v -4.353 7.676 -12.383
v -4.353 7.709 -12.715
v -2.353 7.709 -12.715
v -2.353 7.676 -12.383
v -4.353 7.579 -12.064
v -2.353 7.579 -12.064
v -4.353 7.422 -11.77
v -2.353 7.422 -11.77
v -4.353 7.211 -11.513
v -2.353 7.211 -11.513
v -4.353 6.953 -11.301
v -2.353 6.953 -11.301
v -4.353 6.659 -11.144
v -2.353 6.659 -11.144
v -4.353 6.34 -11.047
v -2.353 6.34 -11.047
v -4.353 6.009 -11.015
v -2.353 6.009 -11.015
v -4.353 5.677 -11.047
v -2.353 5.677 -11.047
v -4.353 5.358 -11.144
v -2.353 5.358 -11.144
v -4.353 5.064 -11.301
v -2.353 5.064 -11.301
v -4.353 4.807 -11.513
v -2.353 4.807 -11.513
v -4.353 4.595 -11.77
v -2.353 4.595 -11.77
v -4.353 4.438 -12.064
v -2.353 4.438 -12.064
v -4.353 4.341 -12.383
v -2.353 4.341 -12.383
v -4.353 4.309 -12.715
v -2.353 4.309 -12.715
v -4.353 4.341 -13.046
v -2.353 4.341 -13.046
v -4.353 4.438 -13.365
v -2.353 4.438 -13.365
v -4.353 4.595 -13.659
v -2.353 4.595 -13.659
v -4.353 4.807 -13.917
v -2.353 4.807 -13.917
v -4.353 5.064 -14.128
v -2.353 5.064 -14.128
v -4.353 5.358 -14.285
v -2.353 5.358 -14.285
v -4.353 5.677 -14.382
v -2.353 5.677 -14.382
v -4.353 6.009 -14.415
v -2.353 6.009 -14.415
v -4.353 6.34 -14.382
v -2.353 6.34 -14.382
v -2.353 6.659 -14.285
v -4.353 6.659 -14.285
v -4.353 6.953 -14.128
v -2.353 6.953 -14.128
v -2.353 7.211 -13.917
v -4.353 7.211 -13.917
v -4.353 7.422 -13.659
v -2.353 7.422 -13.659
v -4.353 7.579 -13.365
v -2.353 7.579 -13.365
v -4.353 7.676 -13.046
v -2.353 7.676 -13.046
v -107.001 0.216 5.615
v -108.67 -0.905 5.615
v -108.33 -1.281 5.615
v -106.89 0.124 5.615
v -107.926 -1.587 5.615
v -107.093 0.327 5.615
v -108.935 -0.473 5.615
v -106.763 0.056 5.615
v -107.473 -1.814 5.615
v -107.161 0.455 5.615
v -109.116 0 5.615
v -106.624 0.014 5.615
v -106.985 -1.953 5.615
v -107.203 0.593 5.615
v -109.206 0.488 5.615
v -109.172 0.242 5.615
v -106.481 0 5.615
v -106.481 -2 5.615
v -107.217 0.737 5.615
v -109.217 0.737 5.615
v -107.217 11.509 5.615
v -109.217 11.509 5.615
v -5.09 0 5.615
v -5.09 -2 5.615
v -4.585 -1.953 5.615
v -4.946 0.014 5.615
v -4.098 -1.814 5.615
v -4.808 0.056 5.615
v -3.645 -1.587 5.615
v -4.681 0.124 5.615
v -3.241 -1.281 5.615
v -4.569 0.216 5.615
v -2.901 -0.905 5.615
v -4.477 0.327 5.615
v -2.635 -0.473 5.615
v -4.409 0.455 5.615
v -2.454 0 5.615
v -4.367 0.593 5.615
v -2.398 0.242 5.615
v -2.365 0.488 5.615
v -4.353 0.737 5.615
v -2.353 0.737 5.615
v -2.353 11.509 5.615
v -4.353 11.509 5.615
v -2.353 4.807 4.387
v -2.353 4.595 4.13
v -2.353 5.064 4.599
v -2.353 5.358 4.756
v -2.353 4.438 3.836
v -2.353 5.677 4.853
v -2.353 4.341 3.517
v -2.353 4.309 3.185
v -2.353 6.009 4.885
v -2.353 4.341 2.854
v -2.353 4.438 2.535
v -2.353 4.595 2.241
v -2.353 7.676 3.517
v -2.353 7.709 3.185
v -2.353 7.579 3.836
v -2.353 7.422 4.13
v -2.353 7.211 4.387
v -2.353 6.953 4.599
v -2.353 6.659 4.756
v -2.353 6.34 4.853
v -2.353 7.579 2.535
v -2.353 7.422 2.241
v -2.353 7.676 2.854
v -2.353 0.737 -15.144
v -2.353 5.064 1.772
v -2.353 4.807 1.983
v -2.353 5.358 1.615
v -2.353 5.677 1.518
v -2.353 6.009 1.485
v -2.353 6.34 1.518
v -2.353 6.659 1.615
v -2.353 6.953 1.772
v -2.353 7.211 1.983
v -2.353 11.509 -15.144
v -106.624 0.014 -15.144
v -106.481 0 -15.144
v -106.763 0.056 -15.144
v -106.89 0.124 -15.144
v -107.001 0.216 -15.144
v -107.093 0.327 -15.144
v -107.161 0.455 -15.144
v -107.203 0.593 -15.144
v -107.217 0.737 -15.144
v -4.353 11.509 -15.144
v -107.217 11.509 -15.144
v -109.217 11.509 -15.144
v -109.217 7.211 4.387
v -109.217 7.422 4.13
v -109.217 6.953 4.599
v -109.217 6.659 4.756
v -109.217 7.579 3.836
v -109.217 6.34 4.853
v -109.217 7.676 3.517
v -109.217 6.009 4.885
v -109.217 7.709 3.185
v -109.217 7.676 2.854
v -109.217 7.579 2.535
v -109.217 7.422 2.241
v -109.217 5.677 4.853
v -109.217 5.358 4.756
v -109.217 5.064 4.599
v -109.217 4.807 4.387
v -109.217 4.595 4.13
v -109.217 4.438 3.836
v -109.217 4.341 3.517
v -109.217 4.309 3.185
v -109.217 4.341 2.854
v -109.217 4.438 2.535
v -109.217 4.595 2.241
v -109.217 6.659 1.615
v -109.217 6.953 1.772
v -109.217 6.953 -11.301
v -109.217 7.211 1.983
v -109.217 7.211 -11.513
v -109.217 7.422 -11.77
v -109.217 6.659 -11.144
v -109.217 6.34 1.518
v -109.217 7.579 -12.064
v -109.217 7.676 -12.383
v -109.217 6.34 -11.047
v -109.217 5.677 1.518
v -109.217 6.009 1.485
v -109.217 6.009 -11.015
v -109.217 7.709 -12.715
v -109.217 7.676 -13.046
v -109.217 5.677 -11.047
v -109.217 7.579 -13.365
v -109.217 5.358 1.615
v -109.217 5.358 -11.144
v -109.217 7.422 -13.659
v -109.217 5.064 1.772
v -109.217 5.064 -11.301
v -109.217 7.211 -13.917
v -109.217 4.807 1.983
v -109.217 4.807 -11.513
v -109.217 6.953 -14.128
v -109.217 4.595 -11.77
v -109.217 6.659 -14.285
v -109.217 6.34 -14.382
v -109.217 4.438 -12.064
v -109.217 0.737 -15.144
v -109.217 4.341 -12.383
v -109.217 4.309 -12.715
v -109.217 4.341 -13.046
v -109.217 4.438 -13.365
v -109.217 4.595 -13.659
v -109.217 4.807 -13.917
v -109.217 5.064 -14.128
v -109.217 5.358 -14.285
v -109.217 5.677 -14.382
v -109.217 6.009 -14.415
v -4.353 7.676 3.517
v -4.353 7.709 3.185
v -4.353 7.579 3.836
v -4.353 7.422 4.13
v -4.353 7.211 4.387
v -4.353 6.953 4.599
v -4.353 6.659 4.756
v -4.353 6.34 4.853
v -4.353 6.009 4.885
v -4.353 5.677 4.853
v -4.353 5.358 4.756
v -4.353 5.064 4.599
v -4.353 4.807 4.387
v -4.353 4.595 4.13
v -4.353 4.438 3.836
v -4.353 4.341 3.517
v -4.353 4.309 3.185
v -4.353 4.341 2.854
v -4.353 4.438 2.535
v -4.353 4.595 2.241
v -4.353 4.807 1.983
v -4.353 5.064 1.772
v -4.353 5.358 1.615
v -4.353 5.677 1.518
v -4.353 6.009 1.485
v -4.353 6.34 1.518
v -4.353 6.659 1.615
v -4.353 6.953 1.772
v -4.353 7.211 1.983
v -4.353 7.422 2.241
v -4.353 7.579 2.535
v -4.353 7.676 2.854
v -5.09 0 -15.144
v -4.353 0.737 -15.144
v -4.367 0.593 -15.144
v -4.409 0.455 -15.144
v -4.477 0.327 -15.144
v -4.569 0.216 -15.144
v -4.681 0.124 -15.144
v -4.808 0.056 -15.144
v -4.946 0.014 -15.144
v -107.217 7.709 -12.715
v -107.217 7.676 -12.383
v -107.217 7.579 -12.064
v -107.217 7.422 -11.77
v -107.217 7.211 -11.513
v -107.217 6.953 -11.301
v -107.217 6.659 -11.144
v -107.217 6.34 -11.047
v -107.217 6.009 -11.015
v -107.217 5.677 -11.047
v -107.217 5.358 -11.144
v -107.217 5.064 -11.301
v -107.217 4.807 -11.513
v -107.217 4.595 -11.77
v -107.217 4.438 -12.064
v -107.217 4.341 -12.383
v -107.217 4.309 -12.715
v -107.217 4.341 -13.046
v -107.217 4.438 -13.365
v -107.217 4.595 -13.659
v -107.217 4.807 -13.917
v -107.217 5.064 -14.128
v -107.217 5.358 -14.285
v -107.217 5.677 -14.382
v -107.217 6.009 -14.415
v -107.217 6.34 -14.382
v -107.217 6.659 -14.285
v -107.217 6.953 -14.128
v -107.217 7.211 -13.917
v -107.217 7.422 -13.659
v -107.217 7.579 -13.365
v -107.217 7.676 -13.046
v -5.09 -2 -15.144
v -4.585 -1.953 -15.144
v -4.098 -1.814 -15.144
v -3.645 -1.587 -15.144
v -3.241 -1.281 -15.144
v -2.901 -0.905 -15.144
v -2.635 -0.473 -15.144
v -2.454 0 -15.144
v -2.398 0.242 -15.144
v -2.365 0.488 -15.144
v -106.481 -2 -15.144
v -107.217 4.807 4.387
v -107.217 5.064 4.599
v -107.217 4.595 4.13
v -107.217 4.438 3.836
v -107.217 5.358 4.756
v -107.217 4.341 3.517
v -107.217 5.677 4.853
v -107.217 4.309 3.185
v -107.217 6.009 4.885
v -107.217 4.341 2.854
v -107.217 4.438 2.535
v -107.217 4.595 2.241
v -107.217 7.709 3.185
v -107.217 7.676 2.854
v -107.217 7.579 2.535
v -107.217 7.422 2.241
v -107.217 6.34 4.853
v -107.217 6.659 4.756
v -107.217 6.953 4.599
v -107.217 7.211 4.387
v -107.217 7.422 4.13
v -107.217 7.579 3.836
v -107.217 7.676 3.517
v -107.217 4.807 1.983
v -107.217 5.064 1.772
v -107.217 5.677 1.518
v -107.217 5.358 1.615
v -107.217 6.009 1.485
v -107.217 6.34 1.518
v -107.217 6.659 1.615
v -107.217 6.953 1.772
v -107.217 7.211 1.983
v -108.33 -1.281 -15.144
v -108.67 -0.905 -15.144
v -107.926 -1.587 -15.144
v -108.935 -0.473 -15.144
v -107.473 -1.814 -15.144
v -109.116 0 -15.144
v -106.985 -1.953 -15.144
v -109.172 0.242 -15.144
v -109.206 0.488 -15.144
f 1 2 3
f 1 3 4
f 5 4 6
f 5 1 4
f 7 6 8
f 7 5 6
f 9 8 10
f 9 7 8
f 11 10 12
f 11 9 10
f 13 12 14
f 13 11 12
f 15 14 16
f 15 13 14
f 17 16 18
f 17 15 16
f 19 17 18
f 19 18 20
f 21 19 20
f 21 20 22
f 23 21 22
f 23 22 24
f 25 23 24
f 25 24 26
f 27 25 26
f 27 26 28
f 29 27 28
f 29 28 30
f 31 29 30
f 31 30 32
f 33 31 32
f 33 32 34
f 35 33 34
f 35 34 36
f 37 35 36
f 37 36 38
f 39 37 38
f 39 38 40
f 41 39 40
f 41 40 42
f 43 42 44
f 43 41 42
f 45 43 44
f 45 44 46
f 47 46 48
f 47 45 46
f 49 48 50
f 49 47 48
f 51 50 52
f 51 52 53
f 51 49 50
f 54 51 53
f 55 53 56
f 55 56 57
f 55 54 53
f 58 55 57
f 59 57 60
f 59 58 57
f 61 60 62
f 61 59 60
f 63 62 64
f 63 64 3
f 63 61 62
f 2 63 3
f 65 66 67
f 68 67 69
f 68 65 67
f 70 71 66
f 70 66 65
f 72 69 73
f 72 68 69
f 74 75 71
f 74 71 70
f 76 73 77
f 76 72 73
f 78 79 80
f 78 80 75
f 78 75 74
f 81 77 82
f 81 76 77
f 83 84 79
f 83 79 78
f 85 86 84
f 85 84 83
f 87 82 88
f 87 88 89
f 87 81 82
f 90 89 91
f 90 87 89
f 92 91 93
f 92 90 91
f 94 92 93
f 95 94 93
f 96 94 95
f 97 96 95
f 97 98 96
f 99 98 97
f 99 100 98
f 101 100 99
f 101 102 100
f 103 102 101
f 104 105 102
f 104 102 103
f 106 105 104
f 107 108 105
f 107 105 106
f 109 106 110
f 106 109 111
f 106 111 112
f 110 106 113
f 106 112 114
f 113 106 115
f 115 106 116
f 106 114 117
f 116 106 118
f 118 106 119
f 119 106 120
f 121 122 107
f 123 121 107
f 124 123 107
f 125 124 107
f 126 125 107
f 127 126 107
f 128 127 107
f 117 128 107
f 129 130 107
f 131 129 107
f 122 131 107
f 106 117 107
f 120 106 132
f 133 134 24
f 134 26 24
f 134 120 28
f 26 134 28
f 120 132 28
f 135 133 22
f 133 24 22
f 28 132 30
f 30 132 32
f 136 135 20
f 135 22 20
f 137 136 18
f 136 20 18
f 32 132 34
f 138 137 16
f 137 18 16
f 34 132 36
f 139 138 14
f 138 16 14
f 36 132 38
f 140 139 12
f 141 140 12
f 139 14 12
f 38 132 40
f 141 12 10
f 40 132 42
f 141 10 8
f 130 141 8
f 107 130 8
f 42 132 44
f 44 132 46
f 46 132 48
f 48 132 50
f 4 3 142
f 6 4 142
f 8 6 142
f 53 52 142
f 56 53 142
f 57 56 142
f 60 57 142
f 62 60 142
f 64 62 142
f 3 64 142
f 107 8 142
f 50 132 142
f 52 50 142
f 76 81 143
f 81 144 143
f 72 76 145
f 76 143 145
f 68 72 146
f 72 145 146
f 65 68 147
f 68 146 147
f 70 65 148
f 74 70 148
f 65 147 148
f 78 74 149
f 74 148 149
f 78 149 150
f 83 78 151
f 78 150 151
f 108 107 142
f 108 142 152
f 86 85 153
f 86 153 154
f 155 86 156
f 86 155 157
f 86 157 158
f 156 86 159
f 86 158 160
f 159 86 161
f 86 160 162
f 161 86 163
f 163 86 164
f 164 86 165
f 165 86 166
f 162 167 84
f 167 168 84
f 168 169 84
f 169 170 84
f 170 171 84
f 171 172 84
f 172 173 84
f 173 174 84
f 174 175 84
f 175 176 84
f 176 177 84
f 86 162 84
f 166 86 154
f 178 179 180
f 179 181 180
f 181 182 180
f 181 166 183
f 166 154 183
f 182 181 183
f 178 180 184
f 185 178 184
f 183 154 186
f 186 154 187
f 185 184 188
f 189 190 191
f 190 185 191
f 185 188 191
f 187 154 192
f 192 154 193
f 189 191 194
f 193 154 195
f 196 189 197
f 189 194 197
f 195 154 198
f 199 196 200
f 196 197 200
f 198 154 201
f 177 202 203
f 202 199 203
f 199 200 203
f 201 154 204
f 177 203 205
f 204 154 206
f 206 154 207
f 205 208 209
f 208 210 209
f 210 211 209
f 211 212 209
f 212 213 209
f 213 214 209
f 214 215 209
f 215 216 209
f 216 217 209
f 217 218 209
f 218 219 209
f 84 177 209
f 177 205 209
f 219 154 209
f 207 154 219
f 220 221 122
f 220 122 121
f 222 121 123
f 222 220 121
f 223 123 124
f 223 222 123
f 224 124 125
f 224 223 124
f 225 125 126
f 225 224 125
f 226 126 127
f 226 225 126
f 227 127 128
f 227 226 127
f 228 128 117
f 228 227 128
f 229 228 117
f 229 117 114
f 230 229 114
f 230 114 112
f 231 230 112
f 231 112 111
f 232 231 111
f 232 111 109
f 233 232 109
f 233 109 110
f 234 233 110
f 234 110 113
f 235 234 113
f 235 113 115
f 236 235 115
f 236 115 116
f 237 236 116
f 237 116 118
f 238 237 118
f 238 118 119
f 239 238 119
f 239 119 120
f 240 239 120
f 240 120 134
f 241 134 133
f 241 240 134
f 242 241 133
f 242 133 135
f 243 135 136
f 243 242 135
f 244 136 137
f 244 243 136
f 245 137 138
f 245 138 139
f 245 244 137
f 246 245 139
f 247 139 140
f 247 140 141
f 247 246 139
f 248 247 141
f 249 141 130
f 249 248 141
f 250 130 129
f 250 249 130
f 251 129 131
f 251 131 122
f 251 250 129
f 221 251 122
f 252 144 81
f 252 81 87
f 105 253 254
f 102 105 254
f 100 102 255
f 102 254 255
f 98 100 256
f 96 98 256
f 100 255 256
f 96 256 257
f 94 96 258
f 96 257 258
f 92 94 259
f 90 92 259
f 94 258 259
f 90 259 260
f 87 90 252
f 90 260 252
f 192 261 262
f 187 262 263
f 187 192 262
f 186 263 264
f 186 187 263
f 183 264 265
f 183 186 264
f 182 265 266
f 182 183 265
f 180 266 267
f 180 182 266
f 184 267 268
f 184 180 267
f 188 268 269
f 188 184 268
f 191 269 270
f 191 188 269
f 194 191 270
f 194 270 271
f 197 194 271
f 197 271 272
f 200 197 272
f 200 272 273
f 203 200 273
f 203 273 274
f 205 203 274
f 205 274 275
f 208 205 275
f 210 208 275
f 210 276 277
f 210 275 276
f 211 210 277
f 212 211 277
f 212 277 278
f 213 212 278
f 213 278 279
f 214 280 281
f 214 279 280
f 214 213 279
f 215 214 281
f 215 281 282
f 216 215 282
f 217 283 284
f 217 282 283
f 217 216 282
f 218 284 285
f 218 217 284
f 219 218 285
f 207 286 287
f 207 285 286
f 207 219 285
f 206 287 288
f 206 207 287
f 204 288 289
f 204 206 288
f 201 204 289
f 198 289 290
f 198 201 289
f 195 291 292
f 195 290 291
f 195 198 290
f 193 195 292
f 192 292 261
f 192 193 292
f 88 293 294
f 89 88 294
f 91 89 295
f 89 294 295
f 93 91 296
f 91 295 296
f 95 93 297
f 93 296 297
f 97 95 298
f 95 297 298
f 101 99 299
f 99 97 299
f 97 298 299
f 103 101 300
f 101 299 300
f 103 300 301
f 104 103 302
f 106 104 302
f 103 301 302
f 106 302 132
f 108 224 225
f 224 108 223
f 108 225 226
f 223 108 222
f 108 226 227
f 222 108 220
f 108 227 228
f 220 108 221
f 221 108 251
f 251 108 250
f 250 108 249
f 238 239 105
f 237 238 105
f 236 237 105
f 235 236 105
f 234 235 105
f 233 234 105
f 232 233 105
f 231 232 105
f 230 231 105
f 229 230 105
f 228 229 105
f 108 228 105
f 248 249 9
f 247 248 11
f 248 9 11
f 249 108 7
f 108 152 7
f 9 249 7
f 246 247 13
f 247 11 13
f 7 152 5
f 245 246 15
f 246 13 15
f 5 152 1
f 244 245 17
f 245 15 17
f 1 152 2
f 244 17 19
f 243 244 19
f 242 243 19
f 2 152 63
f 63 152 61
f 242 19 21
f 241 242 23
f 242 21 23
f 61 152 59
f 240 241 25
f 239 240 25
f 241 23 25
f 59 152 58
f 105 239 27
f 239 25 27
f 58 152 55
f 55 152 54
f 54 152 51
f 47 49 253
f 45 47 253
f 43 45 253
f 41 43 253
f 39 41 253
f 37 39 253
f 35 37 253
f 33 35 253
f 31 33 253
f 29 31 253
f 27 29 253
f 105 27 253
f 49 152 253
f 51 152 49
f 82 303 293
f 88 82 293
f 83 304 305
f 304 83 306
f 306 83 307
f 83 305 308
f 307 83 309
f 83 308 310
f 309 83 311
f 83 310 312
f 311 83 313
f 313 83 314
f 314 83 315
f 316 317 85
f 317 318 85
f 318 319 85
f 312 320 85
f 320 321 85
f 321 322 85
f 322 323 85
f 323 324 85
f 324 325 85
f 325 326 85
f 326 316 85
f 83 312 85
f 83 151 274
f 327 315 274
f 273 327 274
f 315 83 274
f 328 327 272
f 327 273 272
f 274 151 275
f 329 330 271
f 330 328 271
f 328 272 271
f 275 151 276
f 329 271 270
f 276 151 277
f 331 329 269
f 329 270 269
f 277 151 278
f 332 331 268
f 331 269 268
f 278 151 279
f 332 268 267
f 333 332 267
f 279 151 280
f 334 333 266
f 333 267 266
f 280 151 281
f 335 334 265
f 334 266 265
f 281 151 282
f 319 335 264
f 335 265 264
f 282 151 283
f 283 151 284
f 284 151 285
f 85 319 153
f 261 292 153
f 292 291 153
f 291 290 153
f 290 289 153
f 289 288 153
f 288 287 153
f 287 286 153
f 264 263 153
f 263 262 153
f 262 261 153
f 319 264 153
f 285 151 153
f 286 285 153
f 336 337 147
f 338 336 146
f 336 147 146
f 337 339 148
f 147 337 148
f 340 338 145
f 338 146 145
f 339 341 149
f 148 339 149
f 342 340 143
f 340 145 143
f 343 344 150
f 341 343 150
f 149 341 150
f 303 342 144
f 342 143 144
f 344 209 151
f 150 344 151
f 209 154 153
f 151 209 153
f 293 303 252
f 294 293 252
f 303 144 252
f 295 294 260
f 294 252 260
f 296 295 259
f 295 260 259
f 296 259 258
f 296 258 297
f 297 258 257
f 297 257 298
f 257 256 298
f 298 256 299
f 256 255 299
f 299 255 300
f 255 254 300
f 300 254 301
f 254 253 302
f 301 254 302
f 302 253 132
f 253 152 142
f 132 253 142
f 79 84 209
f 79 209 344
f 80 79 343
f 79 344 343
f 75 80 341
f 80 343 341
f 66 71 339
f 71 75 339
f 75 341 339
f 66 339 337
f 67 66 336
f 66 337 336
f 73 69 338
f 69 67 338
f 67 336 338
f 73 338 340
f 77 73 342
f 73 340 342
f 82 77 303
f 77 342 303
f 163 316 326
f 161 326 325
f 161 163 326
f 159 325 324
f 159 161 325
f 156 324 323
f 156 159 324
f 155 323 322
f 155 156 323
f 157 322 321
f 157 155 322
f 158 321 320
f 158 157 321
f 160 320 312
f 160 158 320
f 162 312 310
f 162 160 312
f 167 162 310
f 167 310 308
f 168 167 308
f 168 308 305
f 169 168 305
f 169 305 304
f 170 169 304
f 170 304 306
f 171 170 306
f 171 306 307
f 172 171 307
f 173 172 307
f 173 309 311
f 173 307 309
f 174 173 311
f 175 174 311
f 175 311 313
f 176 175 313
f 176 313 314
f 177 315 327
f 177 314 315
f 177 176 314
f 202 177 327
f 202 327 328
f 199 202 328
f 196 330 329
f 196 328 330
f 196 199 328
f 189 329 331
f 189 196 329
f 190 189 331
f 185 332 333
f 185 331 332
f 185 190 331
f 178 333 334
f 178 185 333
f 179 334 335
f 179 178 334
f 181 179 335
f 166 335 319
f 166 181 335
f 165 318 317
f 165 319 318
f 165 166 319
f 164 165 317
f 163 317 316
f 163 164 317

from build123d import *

# Parameters (mm, degrees)
SKETCH_2_W             = 128.39072245
SKETCH_2_H             = 20.758785388
SKETCH_2_R             = 1.7
SM_BASE_FLANGE_1_DEPTH = 2
OTHER_START            = -15.144216699
OTHER_1_DEPTH          = 20.758785388
OTHER_START_2          = -11.014823905
OTHER_1_2_DEPTH        = 12.4999998
OTHER_1_3_DEPTH        = 0.729392594
OTHER_START_3          = 4.885176095
OTHER_1_4_DEPTH        = 0.729392594
OTHER_START_4          = -14.414824105
OTHER_1_5_DEPTH        = 19.3000002
OTHER_START_5          = -109.217240912
OTHER_1_6_OUTLINE_R    = 1.7
OTHER_1_6_DEPTH        = 106.86392245


with BuildPart() as part:
    # 基体-法兰1: sheet metal written as solids
    # Sketch 2 → 基体-法兰1 (new body)
    with BuildSketch(Plane(origin=(0, 0, 0), x_dir=(1, 0, 0), z_dir=(0, 1, 0))):
        with Locations((-55.785279687, 4.764824005)):
            Rectangle(SKETCH_2_W, SKETCH_2_H)
        with Locations(Location((2.910081538, 12.714824005, 0), (0, 0, 270))):
            Circle(SKETCH_2_R, mode=Mode.SUBTRACT)
        with Locations(Location((2.910081538, -3.185175995, 0), (0, 0, 270))):
            Circle(SKETCH_2_R, mode=Mode.SUBTRACT)
        with Locations(Location((-114.480640912, -3.185175995, 0), (0, 0, 90))):
            Circle(SKETCH_2_R, mode=Mode.SUBTRACT)
        with Locations(Location((-114.480640912, 12.714824005, 0), (0, 0, 90))):
            Circle(SKETCH_2_R, mode=Mode.SUBTRACT)
    extrude(amount=-SM_BASE_FLANGE_1_DEPTH)

    # Other 1: read off the stored shape, not the designer's step
    # Other 1 outline → Other 1 (cut)
    with BuildSketch(Plane.XY.offset(OTHER_START)):
        with BuildLine():
            Line((-119.980640912, -2), (-106.480640912, -2))
            ThreePointArc((-106.480640912, -2), (-108.134908121, -1.443395312), (-109.11624331, 0))
            Line((-109.11624331, 0), (-119.980640912, 0))
            Line((-119.980640912, 0), (-119.980640912, -2))
        make_face()
        with BuildLine():
            ThreePointArc((-2.454316064, 0), (-3.435651253, -1.443395312), (-5.089918462, -2))
            Line((-5.089918462, -2), (8.410081538, -2))
            Line((8.410081538, -2), (8.410081538, 0))
            Line((8.410081538, 0), (-2.454316064, 0))
        make_face()
    extrude(amount=OTHER_1_DEPTH, mode=Mode.SUBTRACT)

    # Other 1 2 outline → Other 1 2 (add)
    with BuildSketch(Plane.XY.offset(OTHER_START_2)):
        with BuildLine():
            ThreePointArc((-109.217240912, 0.7366), (-109.191873941, 0.364854094), (-109.11624331, 0))
            Line((-109.11624331, 0), (-106.480640912, 0))
            ThreePointArc((-106.480640912, 0), (-107.001495767, 0.215745145), (-107.217240912, 0.7366))
            Line((-107.217240912, 0.7366), (-107.217240912, 11.508755099))
            Line((-107.217240912, 11.508755099), (-109.217240912, 11.508755099))
            Line((-109.217240912, 11.508755099), (-109.217240912, 0.7366))
        make_face()
        with BuildLine():
            Line((-5.089918462, 0), (-2.454316064, 0))
            ThreePointArc((-2.454316064, 0), (-2.378685433, 0.364854094), (-2.353318462, 0.7366))
            Line((-2.353318462, 0.7366), (-2.353318462, 11.508755099))
            Line((-2.353318462, 11.508755099), (-4.353318462, 11.508755099))
            Line((-4.353318462, 11.508755099), (-4.353318462, 0.7366))
            ThreePointArc((-4.353318462, 0.7366), (-4.569063607, 0.215745145), (-5.089918462, 0))
        make_face()
    extrude(amount=OTHER_1_2_DEPTH)

    # Other 1 3 outline → Other 1 3 (add)
    with BuildSketch(Plane.XY.offset(OTHER_START)):
        with BuildLine():
            ThreePointArc((-109.217240912, 0.7366), (-109.191873941, 0.364854094), (-109.11624331, 0))
            Line((-109.11624331, 0), (-106.480640912, 0))
            ThreePointArc((-106.480640912, 0), (-107.001495767, 0.215745145), (-107.217240912, 0.7366))
            Line((-107.217240912, 0.7366), (-107.217240912, 11.508755099))
            Line((-107.217240912, 11.508755099), (-109.217240912, 11.508755099))
            Line((-109.217240912, 11.508755099), (-109.217240912, 0.7366))
        make_face()
        with BuildLine():
            Line((-5.089918462, 0), (-2.454316064, 0))
            ThreePointArc((-2.454316064, 0), (-2.378685433, 0.364854094), (-2.353318462, 0.7366))
            Line((-2.353318462, 0.7366), (-2.353318462, 11.508755099))
            Line((-2.353318462, 11.508755099), (-4.353318462, 11.508755099))
            Line((-4.353318462, 11.508755099), (-4.353318462, 0.7366))
            ThreePointArc((-4.353318462, 0.7366), (-4.569063607, 0.215745145), (-5.089918462, 0))
        make_face()
    extrude(amount=OTHER_1_3_DEPTH)

    # Other 1 4 outline → Other 1 4 (add)
    with BuildSketch(Plane.XY.offset(OTHER_START_3)):
        with BuildLine():
            ThreePointArc((-109.217240912, 0.7366), (-109.191873941, 0.364854094), (-109.11624331, 0))
            Line((-109.11624331, 0), (-106.480640912, 0))
            ThreePointArc((-106.480640912, 0), (-107.001495767, 0.215745145), (-107.217240912, 0.7366))
            Line((-107.217240912, 0.7366), (-107.217240912, 11.508755099))
            Line((-107.217240912, 11.508755099), (-109.217240912, 11.508755099))
            Line((-109.217240912, 11.508755099), (-109.217240912, 0.7366))
        make_face()
        with BuildLine():
            Line((-5.089918462, 0), (-2.454316064, 0))
            ThreePointArc((-2.454316064, 0), (-2.378685433, 0.364854094), (-2.353318462, 0.7366))
            Line((-2.353318462, 0.7366), (-2.353318462, 11.508755099))
            Line((-2.353318462, 11.508755099), (-4.353318462, 11.508755099))
            Line((-4.353318462, 11.508755099), (-4.353318462, 0.7366))
            ThreePointArc((-4.353318462, 0.7366), (-4.569063607, 0.215745145), (-5.089918462, 0))
        make_face()
    extrude(amount=OTHER_1_4_DEPTH)

    # Other 1 5 outline → Other 1 5 (add)
    with BuildSketch(Plane.XY.offset(OTHER_START_4)):
        with BuildLine():
            ThreePointArc((-4.353318462, 0.7366), (-4.569063607, 0.215745145), (-5.089918462, 0))
            Line((-5.089918462, 0), (-2.454316064, 0))
            ThreePointArc((-2.454316064, 0), (-2.378685433, 0.364854094), (-2.353318462, 0.7366))
            Line((-2.353318462, 0.7366), (-2.353318462, 11.508755099))
            Line((-2.353318462, 11.508755099), (-4.353318462, 11.508755099))
            Line((-4.353318462, 11.508755099), (-4.353318462, 0.7366))
        make_face()
        with BuildLine():
            ThreePointArc((-109.217240912, 0.7366), (-109.191873941, 0.364854094), (-109.11624331, 0))
            Line((-109.11624331, 0), (-106.480640912, 0))
            ThreePointArc((-106.480640912, 0), (-107.001495767, 0.215745145), (-107.217240912, 0.7366))
            Line((-107.217240912, 0.7366), (-107.217240912, 11.508755099))
            Line((-107.217240912, 11.508755099), (-109.217240912, 11.508755099))
            Line((-109.217240912, 11.508755099), (-109.217240912, 0.7366))
        make_face()
    extrude(amount=OTHER_1_5_DEPTH)

    # Other 1 6 outline → Other 1 6 (cut)
    with BuildSketch(Plane.YZ.offset(OTHER_START_5)):
        with Locations((6.008755099, -12.714824005)):
            Circle(OTHER_1_6_OUTLINE_R)
        with Locations((6.008755099, 3.185175995)):
            Circle(OTHER_1_6_OUTLINE_R)
    extrude(amount=OTHER_1_6_DEPTH, mode=Mode.SUBTRACT)


solid = part.part
